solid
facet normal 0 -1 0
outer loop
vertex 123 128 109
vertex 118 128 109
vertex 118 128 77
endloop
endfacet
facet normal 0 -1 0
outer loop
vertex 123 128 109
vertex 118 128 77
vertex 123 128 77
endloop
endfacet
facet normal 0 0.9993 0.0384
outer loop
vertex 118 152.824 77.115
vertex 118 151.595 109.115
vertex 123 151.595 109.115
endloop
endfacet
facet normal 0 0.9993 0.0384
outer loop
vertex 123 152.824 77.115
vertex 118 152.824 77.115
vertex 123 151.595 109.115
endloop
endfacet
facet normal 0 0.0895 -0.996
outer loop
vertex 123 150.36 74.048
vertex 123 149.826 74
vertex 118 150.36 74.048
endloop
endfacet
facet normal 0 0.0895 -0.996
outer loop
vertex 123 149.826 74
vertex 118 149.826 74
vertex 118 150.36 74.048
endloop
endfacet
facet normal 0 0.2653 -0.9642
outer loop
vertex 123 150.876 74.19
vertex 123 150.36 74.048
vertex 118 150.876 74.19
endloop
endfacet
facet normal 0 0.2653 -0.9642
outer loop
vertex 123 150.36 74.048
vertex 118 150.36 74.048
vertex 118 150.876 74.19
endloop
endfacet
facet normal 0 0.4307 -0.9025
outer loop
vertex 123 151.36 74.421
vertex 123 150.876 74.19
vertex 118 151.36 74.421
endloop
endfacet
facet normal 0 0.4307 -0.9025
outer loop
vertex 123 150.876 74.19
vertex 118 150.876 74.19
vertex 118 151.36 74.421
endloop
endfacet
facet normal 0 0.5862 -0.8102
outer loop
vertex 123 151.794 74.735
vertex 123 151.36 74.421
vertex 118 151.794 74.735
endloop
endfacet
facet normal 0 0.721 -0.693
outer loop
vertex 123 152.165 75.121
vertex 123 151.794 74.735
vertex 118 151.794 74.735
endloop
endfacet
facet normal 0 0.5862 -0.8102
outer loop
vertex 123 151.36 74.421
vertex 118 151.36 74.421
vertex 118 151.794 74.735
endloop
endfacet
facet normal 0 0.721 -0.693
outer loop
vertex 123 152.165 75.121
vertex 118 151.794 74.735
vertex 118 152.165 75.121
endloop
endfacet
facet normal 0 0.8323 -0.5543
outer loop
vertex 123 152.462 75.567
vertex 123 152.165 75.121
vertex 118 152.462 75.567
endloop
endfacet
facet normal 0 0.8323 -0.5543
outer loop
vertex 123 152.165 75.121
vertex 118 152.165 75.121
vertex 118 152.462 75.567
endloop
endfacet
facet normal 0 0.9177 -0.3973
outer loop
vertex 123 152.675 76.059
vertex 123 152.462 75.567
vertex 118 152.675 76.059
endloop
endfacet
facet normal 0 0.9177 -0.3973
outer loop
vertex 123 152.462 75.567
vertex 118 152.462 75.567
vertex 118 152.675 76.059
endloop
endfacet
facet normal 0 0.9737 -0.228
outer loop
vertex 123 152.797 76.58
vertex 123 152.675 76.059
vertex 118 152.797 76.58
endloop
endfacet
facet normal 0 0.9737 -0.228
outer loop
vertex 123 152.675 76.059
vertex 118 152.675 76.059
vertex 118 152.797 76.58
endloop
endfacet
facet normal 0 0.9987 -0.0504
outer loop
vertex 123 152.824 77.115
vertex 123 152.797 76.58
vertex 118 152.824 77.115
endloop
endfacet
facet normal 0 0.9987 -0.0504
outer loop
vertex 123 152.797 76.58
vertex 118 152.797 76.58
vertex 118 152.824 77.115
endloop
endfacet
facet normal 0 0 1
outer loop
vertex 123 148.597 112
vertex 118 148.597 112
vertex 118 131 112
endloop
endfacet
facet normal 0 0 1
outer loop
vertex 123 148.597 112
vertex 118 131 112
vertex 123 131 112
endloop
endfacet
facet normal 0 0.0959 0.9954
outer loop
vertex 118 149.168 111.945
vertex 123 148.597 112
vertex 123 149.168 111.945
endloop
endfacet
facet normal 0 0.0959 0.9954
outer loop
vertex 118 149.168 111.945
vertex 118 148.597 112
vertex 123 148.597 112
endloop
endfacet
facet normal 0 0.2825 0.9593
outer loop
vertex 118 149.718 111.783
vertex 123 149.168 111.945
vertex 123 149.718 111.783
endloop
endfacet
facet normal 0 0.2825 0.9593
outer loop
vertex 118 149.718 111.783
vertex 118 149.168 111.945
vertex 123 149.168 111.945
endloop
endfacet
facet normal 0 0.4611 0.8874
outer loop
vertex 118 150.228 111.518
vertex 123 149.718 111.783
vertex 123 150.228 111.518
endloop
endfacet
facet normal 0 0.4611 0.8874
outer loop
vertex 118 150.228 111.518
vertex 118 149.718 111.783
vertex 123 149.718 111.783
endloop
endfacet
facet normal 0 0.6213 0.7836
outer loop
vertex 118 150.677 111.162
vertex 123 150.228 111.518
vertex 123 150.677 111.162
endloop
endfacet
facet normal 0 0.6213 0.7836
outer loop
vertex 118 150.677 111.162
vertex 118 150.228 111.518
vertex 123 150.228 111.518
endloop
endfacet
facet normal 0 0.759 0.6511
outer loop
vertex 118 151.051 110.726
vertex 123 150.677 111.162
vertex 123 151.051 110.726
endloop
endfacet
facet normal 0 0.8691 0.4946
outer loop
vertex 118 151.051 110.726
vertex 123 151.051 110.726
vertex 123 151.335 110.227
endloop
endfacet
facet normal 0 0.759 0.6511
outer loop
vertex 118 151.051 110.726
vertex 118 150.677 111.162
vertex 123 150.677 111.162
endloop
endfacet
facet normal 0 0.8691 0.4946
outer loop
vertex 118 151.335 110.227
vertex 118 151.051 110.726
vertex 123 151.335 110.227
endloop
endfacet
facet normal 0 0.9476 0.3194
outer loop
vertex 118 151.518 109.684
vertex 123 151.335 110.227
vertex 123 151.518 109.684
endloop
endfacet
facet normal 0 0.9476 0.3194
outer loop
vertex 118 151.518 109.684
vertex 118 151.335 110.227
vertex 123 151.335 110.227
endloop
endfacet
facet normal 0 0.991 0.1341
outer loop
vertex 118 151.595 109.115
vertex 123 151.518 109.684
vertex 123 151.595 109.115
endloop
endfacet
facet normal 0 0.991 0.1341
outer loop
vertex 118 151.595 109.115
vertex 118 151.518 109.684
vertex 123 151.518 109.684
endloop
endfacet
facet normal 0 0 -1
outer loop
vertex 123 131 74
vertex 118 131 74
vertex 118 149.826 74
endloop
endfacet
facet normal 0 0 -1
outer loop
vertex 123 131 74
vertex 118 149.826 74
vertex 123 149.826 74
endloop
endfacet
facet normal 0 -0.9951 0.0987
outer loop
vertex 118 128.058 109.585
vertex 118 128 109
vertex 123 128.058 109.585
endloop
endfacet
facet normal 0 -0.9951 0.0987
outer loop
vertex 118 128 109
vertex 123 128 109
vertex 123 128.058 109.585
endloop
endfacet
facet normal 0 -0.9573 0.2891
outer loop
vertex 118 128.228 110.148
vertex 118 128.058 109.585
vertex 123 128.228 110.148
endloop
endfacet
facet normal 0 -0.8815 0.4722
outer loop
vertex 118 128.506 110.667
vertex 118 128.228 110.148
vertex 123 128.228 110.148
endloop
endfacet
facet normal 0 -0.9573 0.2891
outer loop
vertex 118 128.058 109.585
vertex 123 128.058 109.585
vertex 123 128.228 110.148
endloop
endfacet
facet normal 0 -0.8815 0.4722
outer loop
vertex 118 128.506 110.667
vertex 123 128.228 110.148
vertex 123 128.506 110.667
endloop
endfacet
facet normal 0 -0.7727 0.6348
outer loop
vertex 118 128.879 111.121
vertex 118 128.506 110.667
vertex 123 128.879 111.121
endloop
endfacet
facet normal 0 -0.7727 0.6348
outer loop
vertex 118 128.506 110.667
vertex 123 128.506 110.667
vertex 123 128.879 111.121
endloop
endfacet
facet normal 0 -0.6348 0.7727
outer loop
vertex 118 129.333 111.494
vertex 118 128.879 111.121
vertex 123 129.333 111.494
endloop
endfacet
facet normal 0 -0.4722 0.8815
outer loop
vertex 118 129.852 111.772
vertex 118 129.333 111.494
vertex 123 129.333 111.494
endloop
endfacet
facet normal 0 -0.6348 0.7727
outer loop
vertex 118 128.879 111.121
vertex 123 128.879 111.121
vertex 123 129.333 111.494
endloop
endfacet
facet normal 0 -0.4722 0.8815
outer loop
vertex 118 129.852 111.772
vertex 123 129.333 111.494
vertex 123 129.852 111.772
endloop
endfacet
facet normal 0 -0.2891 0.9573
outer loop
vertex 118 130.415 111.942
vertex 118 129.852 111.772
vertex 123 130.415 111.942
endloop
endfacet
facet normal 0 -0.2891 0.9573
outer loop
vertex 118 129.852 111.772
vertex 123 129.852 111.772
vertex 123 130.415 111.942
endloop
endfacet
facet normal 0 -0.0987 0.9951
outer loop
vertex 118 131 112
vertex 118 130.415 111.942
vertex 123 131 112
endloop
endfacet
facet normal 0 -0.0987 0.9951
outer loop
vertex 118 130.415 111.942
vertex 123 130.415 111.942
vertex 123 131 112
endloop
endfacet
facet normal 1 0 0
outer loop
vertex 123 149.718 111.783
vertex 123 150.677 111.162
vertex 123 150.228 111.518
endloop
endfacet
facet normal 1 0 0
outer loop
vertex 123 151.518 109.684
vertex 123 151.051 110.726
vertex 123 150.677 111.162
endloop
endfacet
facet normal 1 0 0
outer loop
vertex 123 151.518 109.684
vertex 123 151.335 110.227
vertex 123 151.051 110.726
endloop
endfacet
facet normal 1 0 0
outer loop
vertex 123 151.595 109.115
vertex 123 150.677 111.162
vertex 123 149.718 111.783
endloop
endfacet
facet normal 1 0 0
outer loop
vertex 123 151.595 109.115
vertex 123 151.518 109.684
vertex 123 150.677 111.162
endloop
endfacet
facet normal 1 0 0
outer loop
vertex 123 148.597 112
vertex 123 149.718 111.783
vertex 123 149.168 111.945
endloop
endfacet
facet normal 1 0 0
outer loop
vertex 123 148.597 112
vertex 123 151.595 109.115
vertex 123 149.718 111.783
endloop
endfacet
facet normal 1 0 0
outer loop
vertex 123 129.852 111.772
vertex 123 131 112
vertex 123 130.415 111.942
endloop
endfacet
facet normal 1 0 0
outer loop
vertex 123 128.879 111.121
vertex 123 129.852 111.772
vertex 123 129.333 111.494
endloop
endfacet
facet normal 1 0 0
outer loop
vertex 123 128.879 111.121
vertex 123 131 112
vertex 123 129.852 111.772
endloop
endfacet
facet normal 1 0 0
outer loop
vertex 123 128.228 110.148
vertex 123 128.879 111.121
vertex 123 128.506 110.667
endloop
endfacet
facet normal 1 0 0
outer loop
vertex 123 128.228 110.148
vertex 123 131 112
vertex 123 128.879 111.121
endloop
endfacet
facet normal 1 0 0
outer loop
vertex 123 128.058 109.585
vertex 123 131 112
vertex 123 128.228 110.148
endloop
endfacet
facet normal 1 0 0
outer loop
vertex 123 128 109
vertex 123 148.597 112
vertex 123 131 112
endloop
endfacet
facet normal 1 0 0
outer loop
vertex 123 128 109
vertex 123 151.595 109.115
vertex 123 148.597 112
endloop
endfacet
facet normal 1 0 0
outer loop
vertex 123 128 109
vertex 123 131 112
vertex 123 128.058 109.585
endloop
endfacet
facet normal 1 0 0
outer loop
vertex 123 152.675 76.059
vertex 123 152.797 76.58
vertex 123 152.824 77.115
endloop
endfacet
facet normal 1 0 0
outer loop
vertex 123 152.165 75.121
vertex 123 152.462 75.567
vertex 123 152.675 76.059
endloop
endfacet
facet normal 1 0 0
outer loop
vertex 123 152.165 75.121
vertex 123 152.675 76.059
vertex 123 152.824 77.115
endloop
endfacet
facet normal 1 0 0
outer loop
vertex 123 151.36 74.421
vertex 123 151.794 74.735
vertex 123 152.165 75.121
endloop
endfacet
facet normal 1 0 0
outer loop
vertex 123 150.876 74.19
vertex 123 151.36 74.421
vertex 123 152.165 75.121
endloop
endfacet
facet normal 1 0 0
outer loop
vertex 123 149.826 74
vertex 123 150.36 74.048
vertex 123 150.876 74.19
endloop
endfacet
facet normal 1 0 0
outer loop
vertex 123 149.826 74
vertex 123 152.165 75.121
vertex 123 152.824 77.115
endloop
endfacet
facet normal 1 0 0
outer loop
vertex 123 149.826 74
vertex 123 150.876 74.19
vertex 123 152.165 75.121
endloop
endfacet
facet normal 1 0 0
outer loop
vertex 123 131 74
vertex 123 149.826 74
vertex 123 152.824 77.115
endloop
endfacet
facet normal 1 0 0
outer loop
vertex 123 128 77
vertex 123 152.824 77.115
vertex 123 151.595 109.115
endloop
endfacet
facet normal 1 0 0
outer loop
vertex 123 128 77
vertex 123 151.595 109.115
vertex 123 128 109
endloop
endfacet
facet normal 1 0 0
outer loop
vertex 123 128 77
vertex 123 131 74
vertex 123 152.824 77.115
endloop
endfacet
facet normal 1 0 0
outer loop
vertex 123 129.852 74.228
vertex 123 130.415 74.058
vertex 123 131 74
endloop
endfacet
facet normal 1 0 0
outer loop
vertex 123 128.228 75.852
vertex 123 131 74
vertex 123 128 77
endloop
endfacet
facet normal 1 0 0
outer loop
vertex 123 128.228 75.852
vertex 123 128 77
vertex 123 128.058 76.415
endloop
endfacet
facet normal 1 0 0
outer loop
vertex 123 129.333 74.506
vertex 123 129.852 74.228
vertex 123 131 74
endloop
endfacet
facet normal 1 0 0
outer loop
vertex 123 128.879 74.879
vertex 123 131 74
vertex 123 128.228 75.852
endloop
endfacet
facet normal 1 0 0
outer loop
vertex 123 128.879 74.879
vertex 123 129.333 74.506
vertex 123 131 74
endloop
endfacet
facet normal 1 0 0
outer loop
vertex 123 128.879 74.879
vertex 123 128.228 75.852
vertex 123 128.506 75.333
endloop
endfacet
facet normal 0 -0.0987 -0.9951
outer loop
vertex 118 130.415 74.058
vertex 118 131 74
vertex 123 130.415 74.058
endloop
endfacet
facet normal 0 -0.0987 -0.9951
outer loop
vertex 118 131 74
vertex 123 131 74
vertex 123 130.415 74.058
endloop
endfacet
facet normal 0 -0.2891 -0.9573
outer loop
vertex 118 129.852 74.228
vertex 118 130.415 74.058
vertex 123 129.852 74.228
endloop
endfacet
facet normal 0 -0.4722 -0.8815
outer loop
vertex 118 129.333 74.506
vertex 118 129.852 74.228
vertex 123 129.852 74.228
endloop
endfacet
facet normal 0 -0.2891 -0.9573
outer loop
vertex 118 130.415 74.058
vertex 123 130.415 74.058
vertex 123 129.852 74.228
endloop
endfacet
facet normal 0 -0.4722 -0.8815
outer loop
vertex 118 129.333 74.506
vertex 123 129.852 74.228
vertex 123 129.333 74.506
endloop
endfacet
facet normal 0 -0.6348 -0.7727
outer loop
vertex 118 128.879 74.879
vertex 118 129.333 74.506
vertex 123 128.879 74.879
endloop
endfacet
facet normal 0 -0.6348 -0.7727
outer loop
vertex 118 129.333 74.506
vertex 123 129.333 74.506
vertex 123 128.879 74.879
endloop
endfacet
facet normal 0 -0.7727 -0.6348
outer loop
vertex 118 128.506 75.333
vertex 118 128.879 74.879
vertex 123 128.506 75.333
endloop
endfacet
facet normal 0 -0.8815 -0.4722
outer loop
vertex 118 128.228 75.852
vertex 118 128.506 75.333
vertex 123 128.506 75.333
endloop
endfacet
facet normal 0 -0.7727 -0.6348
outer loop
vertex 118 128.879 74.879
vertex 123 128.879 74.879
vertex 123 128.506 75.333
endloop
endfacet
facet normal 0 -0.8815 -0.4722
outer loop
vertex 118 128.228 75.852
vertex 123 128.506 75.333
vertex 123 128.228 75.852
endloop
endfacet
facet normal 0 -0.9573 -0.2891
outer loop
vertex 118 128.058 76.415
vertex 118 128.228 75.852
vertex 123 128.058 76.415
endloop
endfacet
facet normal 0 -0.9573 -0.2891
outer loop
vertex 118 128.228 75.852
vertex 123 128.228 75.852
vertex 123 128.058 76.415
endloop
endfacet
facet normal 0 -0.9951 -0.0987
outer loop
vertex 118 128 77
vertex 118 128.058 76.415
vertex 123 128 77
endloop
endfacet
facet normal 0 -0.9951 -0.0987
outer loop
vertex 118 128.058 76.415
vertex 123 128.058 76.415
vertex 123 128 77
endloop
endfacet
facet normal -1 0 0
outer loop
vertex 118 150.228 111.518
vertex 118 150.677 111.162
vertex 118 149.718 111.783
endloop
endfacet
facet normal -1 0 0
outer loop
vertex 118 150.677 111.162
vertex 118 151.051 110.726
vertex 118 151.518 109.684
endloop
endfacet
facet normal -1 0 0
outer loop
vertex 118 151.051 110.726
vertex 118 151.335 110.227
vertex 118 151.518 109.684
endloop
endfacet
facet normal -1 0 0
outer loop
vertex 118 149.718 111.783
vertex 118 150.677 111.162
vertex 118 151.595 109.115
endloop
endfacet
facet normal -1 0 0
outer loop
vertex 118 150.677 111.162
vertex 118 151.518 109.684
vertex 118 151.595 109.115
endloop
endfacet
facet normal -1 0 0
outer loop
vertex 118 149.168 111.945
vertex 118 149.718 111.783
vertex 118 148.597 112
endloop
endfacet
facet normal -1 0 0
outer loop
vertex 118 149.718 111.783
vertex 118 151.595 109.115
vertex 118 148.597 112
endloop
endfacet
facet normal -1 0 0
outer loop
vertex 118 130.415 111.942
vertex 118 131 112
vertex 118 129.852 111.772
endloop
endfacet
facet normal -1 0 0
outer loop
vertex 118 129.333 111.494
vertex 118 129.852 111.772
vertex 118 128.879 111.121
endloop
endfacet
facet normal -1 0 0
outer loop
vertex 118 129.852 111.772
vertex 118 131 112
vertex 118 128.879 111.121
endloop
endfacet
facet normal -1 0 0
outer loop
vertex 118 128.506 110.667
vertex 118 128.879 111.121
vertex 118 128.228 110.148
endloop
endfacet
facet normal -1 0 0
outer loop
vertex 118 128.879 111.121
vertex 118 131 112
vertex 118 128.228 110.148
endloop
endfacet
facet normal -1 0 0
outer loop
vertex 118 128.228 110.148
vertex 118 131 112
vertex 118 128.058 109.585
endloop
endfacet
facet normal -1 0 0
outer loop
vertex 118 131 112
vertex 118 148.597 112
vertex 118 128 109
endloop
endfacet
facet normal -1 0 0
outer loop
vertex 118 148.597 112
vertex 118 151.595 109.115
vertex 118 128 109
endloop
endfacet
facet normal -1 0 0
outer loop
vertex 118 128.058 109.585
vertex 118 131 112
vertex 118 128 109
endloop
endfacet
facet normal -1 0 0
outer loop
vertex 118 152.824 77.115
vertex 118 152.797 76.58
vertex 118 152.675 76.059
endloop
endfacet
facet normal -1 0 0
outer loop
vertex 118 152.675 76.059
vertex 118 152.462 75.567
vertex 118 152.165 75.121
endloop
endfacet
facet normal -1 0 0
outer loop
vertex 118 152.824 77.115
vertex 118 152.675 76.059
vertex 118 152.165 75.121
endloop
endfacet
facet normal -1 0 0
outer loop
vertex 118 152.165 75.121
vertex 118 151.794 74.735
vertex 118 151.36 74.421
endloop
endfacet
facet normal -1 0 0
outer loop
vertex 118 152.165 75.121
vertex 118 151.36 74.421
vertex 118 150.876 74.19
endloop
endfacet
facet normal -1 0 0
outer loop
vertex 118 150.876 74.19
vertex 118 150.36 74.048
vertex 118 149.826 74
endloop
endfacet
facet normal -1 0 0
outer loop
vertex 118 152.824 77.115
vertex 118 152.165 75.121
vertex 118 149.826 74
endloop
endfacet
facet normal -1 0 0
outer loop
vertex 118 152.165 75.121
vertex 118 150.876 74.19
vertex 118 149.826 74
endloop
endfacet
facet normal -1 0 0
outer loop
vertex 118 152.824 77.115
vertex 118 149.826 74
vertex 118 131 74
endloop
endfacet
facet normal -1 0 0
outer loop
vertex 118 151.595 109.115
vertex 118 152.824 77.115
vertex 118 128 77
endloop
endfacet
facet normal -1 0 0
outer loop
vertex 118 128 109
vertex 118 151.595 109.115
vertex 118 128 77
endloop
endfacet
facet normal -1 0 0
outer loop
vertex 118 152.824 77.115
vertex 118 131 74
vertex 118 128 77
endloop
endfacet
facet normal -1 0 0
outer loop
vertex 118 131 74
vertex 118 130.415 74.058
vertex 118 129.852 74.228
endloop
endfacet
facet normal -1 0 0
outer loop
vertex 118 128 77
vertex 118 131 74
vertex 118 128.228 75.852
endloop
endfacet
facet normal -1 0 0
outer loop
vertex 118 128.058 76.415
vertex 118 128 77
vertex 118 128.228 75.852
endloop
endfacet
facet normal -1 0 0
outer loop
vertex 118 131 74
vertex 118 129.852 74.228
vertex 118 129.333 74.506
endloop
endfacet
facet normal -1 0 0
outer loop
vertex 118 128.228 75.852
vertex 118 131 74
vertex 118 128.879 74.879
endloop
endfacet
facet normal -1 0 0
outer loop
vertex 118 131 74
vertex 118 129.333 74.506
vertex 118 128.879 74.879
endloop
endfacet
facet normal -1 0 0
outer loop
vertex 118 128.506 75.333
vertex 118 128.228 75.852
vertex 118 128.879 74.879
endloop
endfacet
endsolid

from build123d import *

# Parameters (mm, degrees)
BOX009_W          = 5
BOX009_H          = 24
BOX009_DEPTH      = 40
BOX009_ROLL_ANGLE = -2.2
BOX008_W          = 5
BOX008_H          = 25
BOX008_DEPTH      = 38
FILLET046_R       = 3


with BuildPart() as cube080:
    # Box009 → Box009 (new body)
    with BuildSketch(Plane.XY):
        with Locations((2.5, 12)):
            Rectangle(BOX009_W, BOX009_H)
    extrude(amount=BOX009_DEPTH)


with BuildPart() as cube080_1:
    # Box009 roll: moved
    add(cube080.part.rotate(Axis((0, 0, 0), (1, 0, 0)), BOX009_ROLL_ANGLE))


with BuildPart() as cube080_2:
    # Box009 placement: moved
    add(cube080_1.part.moved(Location((175, -24, -1))))


with BuildPart() as cut003:
    # Box008 → Box008 (new body)
    with BuildSketch(Plane(origin=(175, 0, 0), x_dir=(1, 0, 0), z_dir=(0, 0, 1))):
        with Locations((2.5, 12.5)):
            Rectangle(BOX008_W, BOX008_H)
    extrude(amount=BOX008_DEPTH)

    # Cut003: cut Cube080
    add(cube080_2.part, mode=Mode.SUBTRACT)


with BuildPart() as cut003_1:
    # Cut003 placement: moved
    add(cut003.part.moved(Location((0, 1, 1))))


with BuildPart() as fillet046:
    # Part__Mirroring001: instance of Cut003
    add(cut003_1.part.mirror(Plane(origin=(0, 0, 0), x_dir=(1, 0, 0), z_dir=(0, 1, 0))))


with BuildPart() as fillet046_1:
    # Part__Mirroring001 placement: moved
    add(fillet046.part.moved(Location((-57, 154, 73))))

    # Fillet046
    fillet046_edges = [fillet046_1.edges().sort_by_distance(p)[0] for p in [
        (120.5, 128, 74),
        (120.5, 128, 112),
        (120.5, 152.943881, 74),
        (120.5, 151.484068, 112),
    ]]
    fillet(fillet046_edges, radius=FILLET046_R)


solid = fillet046_1.part
